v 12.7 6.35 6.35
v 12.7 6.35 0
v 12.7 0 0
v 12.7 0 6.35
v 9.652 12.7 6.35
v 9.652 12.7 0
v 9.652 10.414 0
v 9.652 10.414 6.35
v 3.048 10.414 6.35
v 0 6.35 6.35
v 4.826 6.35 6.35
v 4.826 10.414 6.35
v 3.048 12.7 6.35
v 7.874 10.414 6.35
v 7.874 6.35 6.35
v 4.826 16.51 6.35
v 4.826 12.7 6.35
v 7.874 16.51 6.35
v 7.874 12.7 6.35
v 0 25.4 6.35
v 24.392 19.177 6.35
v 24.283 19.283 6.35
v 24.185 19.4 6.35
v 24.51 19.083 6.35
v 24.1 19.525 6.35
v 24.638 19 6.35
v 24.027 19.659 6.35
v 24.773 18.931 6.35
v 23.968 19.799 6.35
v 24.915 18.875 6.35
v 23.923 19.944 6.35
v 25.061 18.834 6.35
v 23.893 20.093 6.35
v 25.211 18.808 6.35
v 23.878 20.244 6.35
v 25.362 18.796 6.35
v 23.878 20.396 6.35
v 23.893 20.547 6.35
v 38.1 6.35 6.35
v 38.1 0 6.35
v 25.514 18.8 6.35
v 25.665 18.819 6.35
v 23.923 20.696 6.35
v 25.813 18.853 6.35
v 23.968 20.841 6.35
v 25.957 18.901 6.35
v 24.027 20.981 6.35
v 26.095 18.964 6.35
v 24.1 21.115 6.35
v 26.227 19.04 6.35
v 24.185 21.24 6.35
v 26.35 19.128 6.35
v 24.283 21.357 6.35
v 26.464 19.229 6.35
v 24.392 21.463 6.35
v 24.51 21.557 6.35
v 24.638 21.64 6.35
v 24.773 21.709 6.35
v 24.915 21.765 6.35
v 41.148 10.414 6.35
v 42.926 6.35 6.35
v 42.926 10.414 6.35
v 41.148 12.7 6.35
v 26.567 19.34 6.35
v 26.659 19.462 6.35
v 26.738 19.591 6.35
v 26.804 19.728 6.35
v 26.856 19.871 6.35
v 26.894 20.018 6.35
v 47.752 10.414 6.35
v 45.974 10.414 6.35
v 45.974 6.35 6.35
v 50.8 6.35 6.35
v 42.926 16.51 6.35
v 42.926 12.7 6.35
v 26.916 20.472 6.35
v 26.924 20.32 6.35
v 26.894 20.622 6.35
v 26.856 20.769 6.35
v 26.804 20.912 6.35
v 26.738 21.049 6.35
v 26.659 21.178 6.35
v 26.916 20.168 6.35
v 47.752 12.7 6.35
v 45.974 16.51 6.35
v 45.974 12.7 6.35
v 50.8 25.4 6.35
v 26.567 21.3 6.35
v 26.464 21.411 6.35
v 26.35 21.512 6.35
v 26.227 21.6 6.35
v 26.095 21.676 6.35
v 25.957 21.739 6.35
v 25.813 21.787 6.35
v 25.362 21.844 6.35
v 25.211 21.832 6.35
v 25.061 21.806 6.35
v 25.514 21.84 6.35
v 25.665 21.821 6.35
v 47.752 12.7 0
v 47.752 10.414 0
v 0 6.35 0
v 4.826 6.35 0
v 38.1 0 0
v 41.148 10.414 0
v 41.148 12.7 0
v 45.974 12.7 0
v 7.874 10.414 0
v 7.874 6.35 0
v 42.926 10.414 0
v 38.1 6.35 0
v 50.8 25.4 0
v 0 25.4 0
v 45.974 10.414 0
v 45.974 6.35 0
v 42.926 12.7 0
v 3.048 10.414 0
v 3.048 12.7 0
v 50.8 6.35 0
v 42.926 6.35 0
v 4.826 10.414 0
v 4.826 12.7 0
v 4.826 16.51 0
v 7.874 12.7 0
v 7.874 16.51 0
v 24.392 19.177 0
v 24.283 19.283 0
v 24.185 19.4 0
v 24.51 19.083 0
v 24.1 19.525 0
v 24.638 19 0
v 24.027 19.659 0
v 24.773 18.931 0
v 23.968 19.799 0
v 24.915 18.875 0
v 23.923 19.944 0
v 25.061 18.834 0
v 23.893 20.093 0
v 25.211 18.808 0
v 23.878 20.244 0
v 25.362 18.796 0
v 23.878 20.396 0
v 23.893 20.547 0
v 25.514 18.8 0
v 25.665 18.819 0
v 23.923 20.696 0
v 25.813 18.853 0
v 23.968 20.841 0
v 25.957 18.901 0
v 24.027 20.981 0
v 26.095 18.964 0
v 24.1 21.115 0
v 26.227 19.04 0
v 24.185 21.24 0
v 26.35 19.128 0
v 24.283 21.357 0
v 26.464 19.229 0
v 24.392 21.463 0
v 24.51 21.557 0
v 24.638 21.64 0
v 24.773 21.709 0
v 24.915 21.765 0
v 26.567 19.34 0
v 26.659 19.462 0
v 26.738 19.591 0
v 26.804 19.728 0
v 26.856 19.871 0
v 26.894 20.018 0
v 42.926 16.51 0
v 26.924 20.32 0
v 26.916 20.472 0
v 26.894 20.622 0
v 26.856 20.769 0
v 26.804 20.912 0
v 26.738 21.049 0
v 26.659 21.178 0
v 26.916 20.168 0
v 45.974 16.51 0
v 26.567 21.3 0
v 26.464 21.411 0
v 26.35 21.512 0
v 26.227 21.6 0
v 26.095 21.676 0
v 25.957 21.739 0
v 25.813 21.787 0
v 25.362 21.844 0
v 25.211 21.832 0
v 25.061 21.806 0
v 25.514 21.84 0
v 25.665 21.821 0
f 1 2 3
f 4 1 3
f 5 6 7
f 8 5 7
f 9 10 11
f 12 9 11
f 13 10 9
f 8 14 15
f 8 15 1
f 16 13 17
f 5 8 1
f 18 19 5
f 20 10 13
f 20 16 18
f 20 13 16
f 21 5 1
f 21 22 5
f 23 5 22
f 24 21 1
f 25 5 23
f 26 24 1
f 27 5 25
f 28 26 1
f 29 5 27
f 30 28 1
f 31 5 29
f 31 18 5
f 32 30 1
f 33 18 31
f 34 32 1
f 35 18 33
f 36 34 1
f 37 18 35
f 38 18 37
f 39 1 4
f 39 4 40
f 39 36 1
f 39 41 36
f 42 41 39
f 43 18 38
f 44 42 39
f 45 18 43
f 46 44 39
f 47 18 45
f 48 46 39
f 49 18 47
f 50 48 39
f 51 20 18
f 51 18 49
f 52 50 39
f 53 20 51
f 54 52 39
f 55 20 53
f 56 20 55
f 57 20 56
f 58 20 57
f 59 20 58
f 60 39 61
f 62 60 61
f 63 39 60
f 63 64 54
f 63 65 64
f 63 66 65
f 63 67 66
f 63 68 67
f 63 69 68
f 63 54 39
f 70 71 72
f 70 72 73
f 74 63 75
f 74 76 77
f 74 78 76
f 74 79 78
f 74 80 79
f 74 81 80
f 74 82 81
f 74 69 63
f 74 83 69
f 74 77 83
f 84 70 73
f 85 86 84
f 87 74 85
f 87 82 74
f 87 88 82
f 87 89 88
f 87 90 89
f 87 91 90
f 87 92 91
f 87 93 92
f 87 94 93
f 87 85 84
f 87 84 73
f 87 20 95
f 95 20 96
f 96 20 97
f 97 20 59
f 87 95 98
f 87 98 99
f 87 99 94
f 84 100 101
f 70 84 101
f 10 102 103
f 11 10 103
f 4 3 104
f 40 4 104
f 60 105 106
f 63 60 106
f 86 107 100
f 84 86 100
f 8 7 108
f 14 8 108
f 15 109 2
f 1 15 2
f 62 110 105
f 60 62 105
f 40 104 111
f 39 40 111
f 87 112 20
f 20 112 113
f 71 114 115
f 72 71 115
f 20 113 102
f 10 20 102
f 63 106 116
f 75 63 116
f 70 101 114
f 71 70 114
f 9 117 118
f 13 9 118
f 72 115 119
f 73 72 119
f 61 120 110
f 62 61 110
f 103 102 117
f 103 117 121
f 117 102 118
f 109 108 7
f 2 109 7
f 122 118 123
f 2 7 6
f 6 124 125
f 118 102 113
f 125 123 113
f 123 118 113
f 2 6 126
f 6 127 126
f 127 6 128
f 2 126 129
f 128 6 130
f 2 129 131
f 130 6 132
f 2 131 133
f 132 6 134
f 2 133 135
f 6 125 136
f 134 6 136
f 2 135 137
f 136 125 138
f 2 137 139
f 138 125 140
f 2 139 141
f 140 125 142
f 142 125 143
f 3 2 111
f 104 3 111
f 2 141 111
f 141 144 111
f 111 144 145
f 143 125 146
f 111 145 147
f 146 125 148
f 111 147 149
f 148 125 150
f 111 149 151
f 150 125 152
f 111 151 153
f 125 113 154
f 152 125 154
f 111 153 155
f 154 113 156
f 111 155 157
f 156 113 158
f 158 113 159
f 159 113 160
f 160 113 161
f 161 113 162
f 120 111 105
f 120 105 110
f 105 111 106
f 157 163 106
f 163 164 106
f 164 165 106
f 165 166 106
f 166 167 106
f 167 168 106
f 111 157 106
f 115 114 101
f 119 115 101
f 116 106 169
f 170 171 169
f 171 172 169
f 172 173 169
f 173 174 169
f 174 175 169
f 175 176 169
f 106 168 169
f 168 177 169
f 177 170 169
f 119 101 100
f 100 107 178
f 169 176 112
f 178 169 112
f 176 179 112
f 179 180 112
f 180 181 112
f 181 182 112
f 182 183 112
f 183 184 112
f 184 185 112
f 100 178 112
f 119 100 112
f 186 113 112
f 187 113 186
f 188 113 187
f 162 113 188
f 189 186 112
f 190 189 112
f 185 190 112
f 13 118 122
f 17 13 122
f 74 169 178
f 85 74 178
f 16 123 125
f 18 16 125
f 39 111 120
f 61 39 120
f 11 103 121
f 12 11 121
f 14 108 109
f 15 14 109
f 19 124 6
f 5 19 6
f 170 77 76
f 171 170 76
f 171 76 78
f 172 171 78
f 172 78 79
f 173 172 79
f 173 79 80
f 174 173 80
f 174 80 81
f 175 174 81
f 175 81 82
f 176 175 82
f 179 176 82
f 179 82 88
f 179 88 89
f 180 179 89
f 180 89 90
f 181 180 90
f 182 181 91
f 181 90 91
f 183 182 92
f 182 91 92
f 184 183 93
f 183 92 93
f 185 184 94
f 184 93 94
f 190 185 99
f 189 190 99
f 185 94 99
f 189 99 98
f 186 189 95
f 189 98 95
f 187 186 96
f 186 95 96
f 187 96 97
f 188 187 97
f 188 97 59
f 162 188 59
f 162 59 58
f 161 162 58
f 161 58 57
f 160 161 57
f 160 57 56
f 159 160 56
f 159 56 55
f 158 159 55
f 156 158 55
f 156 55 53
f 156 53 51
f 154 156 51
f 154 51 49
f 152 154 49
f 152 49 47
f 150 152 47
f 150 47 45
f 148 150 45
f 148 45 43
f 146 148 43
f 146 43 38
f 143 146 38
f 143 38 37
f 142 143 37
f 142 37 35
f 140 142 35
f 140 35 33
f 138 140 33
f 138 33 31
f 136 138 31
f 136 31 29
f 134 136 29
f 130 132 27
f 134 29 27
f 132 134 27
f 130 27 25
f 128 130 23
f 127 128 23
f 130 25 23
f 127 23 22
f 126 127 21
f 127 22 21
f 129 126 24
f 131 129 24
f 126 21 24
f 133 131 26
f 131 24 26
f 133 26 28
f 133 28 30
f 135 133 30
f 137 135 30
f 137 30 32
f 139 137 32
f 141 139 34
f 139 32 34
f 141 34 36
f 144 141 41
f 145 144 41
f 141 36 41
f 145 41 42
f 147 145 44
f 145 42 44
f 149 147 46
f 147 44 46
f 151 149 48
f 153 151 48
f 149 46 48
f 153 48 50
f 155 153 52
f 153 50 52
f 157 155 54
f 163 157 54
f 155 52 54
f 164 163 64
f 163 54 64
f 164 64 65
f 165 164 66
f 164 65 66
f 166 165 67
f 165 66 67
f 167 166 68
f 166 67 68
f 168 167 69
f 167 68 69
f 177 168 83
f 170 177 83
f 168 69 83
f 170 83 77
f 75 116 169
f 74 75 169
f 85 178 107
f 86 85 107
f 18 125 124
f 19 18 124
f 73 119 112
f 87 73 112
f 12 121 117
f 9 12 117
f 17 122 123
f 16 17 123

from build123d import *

# Parameters (mm, degrees)
BOSS_EXTRUDE1_DEPTH = 6.35
SKETCH2_R           = 1.524
CUT_EXTRUDE1_DEPTH  = 7.35


with BuildPart() as part:
    # Sketch1 → Boss-Extrude1 (new body)
    with BuildSketch(Plane.XY):
        Polygon((50.8, 25.4), (0, 25.4), (0, 6.35), (4.826, 6.35), (4.826, 10.414), (3.048, 10.414), (3.048, 12.7), (4.826, 12.7), (4.826, 16.51), (7.874, 16.51), (7.874, 12.7), (9.652, 12.7), (9.652, 10.414), (7.874, 10.414), (7.874, 6.35), (12.7, 6.35), (12.7, 0), (38.1, 0), (38.1, 6.35), (42.926, 6.35), (42.926, 10.414), (41.148, 10.414), (41.148, 12.7), (42.926, 12.7), (42.926, 16.51), (45.974, 16.51), (45.974, 12.7), (47.752, 12.7), (47.752, 10.414), (45.974, 10.414), (45.974, 6.35), (50.8, 6.35), align=None)
    extrude(amount=BOSS_EXTRUDE1_DEPTH)

    # Sketch2 → Cut-Extrude1 (cut, through all)
    with BuildSketch(Plane.XY.offset(6.35)):
        with Locations((25.4, 20.32)):
            Circle(SKETCH2_R)
    extrude(amount=-CUT_EXTRUDE1_DEPTH, mode=Mode.SUBTRACT)


solid = part.part
